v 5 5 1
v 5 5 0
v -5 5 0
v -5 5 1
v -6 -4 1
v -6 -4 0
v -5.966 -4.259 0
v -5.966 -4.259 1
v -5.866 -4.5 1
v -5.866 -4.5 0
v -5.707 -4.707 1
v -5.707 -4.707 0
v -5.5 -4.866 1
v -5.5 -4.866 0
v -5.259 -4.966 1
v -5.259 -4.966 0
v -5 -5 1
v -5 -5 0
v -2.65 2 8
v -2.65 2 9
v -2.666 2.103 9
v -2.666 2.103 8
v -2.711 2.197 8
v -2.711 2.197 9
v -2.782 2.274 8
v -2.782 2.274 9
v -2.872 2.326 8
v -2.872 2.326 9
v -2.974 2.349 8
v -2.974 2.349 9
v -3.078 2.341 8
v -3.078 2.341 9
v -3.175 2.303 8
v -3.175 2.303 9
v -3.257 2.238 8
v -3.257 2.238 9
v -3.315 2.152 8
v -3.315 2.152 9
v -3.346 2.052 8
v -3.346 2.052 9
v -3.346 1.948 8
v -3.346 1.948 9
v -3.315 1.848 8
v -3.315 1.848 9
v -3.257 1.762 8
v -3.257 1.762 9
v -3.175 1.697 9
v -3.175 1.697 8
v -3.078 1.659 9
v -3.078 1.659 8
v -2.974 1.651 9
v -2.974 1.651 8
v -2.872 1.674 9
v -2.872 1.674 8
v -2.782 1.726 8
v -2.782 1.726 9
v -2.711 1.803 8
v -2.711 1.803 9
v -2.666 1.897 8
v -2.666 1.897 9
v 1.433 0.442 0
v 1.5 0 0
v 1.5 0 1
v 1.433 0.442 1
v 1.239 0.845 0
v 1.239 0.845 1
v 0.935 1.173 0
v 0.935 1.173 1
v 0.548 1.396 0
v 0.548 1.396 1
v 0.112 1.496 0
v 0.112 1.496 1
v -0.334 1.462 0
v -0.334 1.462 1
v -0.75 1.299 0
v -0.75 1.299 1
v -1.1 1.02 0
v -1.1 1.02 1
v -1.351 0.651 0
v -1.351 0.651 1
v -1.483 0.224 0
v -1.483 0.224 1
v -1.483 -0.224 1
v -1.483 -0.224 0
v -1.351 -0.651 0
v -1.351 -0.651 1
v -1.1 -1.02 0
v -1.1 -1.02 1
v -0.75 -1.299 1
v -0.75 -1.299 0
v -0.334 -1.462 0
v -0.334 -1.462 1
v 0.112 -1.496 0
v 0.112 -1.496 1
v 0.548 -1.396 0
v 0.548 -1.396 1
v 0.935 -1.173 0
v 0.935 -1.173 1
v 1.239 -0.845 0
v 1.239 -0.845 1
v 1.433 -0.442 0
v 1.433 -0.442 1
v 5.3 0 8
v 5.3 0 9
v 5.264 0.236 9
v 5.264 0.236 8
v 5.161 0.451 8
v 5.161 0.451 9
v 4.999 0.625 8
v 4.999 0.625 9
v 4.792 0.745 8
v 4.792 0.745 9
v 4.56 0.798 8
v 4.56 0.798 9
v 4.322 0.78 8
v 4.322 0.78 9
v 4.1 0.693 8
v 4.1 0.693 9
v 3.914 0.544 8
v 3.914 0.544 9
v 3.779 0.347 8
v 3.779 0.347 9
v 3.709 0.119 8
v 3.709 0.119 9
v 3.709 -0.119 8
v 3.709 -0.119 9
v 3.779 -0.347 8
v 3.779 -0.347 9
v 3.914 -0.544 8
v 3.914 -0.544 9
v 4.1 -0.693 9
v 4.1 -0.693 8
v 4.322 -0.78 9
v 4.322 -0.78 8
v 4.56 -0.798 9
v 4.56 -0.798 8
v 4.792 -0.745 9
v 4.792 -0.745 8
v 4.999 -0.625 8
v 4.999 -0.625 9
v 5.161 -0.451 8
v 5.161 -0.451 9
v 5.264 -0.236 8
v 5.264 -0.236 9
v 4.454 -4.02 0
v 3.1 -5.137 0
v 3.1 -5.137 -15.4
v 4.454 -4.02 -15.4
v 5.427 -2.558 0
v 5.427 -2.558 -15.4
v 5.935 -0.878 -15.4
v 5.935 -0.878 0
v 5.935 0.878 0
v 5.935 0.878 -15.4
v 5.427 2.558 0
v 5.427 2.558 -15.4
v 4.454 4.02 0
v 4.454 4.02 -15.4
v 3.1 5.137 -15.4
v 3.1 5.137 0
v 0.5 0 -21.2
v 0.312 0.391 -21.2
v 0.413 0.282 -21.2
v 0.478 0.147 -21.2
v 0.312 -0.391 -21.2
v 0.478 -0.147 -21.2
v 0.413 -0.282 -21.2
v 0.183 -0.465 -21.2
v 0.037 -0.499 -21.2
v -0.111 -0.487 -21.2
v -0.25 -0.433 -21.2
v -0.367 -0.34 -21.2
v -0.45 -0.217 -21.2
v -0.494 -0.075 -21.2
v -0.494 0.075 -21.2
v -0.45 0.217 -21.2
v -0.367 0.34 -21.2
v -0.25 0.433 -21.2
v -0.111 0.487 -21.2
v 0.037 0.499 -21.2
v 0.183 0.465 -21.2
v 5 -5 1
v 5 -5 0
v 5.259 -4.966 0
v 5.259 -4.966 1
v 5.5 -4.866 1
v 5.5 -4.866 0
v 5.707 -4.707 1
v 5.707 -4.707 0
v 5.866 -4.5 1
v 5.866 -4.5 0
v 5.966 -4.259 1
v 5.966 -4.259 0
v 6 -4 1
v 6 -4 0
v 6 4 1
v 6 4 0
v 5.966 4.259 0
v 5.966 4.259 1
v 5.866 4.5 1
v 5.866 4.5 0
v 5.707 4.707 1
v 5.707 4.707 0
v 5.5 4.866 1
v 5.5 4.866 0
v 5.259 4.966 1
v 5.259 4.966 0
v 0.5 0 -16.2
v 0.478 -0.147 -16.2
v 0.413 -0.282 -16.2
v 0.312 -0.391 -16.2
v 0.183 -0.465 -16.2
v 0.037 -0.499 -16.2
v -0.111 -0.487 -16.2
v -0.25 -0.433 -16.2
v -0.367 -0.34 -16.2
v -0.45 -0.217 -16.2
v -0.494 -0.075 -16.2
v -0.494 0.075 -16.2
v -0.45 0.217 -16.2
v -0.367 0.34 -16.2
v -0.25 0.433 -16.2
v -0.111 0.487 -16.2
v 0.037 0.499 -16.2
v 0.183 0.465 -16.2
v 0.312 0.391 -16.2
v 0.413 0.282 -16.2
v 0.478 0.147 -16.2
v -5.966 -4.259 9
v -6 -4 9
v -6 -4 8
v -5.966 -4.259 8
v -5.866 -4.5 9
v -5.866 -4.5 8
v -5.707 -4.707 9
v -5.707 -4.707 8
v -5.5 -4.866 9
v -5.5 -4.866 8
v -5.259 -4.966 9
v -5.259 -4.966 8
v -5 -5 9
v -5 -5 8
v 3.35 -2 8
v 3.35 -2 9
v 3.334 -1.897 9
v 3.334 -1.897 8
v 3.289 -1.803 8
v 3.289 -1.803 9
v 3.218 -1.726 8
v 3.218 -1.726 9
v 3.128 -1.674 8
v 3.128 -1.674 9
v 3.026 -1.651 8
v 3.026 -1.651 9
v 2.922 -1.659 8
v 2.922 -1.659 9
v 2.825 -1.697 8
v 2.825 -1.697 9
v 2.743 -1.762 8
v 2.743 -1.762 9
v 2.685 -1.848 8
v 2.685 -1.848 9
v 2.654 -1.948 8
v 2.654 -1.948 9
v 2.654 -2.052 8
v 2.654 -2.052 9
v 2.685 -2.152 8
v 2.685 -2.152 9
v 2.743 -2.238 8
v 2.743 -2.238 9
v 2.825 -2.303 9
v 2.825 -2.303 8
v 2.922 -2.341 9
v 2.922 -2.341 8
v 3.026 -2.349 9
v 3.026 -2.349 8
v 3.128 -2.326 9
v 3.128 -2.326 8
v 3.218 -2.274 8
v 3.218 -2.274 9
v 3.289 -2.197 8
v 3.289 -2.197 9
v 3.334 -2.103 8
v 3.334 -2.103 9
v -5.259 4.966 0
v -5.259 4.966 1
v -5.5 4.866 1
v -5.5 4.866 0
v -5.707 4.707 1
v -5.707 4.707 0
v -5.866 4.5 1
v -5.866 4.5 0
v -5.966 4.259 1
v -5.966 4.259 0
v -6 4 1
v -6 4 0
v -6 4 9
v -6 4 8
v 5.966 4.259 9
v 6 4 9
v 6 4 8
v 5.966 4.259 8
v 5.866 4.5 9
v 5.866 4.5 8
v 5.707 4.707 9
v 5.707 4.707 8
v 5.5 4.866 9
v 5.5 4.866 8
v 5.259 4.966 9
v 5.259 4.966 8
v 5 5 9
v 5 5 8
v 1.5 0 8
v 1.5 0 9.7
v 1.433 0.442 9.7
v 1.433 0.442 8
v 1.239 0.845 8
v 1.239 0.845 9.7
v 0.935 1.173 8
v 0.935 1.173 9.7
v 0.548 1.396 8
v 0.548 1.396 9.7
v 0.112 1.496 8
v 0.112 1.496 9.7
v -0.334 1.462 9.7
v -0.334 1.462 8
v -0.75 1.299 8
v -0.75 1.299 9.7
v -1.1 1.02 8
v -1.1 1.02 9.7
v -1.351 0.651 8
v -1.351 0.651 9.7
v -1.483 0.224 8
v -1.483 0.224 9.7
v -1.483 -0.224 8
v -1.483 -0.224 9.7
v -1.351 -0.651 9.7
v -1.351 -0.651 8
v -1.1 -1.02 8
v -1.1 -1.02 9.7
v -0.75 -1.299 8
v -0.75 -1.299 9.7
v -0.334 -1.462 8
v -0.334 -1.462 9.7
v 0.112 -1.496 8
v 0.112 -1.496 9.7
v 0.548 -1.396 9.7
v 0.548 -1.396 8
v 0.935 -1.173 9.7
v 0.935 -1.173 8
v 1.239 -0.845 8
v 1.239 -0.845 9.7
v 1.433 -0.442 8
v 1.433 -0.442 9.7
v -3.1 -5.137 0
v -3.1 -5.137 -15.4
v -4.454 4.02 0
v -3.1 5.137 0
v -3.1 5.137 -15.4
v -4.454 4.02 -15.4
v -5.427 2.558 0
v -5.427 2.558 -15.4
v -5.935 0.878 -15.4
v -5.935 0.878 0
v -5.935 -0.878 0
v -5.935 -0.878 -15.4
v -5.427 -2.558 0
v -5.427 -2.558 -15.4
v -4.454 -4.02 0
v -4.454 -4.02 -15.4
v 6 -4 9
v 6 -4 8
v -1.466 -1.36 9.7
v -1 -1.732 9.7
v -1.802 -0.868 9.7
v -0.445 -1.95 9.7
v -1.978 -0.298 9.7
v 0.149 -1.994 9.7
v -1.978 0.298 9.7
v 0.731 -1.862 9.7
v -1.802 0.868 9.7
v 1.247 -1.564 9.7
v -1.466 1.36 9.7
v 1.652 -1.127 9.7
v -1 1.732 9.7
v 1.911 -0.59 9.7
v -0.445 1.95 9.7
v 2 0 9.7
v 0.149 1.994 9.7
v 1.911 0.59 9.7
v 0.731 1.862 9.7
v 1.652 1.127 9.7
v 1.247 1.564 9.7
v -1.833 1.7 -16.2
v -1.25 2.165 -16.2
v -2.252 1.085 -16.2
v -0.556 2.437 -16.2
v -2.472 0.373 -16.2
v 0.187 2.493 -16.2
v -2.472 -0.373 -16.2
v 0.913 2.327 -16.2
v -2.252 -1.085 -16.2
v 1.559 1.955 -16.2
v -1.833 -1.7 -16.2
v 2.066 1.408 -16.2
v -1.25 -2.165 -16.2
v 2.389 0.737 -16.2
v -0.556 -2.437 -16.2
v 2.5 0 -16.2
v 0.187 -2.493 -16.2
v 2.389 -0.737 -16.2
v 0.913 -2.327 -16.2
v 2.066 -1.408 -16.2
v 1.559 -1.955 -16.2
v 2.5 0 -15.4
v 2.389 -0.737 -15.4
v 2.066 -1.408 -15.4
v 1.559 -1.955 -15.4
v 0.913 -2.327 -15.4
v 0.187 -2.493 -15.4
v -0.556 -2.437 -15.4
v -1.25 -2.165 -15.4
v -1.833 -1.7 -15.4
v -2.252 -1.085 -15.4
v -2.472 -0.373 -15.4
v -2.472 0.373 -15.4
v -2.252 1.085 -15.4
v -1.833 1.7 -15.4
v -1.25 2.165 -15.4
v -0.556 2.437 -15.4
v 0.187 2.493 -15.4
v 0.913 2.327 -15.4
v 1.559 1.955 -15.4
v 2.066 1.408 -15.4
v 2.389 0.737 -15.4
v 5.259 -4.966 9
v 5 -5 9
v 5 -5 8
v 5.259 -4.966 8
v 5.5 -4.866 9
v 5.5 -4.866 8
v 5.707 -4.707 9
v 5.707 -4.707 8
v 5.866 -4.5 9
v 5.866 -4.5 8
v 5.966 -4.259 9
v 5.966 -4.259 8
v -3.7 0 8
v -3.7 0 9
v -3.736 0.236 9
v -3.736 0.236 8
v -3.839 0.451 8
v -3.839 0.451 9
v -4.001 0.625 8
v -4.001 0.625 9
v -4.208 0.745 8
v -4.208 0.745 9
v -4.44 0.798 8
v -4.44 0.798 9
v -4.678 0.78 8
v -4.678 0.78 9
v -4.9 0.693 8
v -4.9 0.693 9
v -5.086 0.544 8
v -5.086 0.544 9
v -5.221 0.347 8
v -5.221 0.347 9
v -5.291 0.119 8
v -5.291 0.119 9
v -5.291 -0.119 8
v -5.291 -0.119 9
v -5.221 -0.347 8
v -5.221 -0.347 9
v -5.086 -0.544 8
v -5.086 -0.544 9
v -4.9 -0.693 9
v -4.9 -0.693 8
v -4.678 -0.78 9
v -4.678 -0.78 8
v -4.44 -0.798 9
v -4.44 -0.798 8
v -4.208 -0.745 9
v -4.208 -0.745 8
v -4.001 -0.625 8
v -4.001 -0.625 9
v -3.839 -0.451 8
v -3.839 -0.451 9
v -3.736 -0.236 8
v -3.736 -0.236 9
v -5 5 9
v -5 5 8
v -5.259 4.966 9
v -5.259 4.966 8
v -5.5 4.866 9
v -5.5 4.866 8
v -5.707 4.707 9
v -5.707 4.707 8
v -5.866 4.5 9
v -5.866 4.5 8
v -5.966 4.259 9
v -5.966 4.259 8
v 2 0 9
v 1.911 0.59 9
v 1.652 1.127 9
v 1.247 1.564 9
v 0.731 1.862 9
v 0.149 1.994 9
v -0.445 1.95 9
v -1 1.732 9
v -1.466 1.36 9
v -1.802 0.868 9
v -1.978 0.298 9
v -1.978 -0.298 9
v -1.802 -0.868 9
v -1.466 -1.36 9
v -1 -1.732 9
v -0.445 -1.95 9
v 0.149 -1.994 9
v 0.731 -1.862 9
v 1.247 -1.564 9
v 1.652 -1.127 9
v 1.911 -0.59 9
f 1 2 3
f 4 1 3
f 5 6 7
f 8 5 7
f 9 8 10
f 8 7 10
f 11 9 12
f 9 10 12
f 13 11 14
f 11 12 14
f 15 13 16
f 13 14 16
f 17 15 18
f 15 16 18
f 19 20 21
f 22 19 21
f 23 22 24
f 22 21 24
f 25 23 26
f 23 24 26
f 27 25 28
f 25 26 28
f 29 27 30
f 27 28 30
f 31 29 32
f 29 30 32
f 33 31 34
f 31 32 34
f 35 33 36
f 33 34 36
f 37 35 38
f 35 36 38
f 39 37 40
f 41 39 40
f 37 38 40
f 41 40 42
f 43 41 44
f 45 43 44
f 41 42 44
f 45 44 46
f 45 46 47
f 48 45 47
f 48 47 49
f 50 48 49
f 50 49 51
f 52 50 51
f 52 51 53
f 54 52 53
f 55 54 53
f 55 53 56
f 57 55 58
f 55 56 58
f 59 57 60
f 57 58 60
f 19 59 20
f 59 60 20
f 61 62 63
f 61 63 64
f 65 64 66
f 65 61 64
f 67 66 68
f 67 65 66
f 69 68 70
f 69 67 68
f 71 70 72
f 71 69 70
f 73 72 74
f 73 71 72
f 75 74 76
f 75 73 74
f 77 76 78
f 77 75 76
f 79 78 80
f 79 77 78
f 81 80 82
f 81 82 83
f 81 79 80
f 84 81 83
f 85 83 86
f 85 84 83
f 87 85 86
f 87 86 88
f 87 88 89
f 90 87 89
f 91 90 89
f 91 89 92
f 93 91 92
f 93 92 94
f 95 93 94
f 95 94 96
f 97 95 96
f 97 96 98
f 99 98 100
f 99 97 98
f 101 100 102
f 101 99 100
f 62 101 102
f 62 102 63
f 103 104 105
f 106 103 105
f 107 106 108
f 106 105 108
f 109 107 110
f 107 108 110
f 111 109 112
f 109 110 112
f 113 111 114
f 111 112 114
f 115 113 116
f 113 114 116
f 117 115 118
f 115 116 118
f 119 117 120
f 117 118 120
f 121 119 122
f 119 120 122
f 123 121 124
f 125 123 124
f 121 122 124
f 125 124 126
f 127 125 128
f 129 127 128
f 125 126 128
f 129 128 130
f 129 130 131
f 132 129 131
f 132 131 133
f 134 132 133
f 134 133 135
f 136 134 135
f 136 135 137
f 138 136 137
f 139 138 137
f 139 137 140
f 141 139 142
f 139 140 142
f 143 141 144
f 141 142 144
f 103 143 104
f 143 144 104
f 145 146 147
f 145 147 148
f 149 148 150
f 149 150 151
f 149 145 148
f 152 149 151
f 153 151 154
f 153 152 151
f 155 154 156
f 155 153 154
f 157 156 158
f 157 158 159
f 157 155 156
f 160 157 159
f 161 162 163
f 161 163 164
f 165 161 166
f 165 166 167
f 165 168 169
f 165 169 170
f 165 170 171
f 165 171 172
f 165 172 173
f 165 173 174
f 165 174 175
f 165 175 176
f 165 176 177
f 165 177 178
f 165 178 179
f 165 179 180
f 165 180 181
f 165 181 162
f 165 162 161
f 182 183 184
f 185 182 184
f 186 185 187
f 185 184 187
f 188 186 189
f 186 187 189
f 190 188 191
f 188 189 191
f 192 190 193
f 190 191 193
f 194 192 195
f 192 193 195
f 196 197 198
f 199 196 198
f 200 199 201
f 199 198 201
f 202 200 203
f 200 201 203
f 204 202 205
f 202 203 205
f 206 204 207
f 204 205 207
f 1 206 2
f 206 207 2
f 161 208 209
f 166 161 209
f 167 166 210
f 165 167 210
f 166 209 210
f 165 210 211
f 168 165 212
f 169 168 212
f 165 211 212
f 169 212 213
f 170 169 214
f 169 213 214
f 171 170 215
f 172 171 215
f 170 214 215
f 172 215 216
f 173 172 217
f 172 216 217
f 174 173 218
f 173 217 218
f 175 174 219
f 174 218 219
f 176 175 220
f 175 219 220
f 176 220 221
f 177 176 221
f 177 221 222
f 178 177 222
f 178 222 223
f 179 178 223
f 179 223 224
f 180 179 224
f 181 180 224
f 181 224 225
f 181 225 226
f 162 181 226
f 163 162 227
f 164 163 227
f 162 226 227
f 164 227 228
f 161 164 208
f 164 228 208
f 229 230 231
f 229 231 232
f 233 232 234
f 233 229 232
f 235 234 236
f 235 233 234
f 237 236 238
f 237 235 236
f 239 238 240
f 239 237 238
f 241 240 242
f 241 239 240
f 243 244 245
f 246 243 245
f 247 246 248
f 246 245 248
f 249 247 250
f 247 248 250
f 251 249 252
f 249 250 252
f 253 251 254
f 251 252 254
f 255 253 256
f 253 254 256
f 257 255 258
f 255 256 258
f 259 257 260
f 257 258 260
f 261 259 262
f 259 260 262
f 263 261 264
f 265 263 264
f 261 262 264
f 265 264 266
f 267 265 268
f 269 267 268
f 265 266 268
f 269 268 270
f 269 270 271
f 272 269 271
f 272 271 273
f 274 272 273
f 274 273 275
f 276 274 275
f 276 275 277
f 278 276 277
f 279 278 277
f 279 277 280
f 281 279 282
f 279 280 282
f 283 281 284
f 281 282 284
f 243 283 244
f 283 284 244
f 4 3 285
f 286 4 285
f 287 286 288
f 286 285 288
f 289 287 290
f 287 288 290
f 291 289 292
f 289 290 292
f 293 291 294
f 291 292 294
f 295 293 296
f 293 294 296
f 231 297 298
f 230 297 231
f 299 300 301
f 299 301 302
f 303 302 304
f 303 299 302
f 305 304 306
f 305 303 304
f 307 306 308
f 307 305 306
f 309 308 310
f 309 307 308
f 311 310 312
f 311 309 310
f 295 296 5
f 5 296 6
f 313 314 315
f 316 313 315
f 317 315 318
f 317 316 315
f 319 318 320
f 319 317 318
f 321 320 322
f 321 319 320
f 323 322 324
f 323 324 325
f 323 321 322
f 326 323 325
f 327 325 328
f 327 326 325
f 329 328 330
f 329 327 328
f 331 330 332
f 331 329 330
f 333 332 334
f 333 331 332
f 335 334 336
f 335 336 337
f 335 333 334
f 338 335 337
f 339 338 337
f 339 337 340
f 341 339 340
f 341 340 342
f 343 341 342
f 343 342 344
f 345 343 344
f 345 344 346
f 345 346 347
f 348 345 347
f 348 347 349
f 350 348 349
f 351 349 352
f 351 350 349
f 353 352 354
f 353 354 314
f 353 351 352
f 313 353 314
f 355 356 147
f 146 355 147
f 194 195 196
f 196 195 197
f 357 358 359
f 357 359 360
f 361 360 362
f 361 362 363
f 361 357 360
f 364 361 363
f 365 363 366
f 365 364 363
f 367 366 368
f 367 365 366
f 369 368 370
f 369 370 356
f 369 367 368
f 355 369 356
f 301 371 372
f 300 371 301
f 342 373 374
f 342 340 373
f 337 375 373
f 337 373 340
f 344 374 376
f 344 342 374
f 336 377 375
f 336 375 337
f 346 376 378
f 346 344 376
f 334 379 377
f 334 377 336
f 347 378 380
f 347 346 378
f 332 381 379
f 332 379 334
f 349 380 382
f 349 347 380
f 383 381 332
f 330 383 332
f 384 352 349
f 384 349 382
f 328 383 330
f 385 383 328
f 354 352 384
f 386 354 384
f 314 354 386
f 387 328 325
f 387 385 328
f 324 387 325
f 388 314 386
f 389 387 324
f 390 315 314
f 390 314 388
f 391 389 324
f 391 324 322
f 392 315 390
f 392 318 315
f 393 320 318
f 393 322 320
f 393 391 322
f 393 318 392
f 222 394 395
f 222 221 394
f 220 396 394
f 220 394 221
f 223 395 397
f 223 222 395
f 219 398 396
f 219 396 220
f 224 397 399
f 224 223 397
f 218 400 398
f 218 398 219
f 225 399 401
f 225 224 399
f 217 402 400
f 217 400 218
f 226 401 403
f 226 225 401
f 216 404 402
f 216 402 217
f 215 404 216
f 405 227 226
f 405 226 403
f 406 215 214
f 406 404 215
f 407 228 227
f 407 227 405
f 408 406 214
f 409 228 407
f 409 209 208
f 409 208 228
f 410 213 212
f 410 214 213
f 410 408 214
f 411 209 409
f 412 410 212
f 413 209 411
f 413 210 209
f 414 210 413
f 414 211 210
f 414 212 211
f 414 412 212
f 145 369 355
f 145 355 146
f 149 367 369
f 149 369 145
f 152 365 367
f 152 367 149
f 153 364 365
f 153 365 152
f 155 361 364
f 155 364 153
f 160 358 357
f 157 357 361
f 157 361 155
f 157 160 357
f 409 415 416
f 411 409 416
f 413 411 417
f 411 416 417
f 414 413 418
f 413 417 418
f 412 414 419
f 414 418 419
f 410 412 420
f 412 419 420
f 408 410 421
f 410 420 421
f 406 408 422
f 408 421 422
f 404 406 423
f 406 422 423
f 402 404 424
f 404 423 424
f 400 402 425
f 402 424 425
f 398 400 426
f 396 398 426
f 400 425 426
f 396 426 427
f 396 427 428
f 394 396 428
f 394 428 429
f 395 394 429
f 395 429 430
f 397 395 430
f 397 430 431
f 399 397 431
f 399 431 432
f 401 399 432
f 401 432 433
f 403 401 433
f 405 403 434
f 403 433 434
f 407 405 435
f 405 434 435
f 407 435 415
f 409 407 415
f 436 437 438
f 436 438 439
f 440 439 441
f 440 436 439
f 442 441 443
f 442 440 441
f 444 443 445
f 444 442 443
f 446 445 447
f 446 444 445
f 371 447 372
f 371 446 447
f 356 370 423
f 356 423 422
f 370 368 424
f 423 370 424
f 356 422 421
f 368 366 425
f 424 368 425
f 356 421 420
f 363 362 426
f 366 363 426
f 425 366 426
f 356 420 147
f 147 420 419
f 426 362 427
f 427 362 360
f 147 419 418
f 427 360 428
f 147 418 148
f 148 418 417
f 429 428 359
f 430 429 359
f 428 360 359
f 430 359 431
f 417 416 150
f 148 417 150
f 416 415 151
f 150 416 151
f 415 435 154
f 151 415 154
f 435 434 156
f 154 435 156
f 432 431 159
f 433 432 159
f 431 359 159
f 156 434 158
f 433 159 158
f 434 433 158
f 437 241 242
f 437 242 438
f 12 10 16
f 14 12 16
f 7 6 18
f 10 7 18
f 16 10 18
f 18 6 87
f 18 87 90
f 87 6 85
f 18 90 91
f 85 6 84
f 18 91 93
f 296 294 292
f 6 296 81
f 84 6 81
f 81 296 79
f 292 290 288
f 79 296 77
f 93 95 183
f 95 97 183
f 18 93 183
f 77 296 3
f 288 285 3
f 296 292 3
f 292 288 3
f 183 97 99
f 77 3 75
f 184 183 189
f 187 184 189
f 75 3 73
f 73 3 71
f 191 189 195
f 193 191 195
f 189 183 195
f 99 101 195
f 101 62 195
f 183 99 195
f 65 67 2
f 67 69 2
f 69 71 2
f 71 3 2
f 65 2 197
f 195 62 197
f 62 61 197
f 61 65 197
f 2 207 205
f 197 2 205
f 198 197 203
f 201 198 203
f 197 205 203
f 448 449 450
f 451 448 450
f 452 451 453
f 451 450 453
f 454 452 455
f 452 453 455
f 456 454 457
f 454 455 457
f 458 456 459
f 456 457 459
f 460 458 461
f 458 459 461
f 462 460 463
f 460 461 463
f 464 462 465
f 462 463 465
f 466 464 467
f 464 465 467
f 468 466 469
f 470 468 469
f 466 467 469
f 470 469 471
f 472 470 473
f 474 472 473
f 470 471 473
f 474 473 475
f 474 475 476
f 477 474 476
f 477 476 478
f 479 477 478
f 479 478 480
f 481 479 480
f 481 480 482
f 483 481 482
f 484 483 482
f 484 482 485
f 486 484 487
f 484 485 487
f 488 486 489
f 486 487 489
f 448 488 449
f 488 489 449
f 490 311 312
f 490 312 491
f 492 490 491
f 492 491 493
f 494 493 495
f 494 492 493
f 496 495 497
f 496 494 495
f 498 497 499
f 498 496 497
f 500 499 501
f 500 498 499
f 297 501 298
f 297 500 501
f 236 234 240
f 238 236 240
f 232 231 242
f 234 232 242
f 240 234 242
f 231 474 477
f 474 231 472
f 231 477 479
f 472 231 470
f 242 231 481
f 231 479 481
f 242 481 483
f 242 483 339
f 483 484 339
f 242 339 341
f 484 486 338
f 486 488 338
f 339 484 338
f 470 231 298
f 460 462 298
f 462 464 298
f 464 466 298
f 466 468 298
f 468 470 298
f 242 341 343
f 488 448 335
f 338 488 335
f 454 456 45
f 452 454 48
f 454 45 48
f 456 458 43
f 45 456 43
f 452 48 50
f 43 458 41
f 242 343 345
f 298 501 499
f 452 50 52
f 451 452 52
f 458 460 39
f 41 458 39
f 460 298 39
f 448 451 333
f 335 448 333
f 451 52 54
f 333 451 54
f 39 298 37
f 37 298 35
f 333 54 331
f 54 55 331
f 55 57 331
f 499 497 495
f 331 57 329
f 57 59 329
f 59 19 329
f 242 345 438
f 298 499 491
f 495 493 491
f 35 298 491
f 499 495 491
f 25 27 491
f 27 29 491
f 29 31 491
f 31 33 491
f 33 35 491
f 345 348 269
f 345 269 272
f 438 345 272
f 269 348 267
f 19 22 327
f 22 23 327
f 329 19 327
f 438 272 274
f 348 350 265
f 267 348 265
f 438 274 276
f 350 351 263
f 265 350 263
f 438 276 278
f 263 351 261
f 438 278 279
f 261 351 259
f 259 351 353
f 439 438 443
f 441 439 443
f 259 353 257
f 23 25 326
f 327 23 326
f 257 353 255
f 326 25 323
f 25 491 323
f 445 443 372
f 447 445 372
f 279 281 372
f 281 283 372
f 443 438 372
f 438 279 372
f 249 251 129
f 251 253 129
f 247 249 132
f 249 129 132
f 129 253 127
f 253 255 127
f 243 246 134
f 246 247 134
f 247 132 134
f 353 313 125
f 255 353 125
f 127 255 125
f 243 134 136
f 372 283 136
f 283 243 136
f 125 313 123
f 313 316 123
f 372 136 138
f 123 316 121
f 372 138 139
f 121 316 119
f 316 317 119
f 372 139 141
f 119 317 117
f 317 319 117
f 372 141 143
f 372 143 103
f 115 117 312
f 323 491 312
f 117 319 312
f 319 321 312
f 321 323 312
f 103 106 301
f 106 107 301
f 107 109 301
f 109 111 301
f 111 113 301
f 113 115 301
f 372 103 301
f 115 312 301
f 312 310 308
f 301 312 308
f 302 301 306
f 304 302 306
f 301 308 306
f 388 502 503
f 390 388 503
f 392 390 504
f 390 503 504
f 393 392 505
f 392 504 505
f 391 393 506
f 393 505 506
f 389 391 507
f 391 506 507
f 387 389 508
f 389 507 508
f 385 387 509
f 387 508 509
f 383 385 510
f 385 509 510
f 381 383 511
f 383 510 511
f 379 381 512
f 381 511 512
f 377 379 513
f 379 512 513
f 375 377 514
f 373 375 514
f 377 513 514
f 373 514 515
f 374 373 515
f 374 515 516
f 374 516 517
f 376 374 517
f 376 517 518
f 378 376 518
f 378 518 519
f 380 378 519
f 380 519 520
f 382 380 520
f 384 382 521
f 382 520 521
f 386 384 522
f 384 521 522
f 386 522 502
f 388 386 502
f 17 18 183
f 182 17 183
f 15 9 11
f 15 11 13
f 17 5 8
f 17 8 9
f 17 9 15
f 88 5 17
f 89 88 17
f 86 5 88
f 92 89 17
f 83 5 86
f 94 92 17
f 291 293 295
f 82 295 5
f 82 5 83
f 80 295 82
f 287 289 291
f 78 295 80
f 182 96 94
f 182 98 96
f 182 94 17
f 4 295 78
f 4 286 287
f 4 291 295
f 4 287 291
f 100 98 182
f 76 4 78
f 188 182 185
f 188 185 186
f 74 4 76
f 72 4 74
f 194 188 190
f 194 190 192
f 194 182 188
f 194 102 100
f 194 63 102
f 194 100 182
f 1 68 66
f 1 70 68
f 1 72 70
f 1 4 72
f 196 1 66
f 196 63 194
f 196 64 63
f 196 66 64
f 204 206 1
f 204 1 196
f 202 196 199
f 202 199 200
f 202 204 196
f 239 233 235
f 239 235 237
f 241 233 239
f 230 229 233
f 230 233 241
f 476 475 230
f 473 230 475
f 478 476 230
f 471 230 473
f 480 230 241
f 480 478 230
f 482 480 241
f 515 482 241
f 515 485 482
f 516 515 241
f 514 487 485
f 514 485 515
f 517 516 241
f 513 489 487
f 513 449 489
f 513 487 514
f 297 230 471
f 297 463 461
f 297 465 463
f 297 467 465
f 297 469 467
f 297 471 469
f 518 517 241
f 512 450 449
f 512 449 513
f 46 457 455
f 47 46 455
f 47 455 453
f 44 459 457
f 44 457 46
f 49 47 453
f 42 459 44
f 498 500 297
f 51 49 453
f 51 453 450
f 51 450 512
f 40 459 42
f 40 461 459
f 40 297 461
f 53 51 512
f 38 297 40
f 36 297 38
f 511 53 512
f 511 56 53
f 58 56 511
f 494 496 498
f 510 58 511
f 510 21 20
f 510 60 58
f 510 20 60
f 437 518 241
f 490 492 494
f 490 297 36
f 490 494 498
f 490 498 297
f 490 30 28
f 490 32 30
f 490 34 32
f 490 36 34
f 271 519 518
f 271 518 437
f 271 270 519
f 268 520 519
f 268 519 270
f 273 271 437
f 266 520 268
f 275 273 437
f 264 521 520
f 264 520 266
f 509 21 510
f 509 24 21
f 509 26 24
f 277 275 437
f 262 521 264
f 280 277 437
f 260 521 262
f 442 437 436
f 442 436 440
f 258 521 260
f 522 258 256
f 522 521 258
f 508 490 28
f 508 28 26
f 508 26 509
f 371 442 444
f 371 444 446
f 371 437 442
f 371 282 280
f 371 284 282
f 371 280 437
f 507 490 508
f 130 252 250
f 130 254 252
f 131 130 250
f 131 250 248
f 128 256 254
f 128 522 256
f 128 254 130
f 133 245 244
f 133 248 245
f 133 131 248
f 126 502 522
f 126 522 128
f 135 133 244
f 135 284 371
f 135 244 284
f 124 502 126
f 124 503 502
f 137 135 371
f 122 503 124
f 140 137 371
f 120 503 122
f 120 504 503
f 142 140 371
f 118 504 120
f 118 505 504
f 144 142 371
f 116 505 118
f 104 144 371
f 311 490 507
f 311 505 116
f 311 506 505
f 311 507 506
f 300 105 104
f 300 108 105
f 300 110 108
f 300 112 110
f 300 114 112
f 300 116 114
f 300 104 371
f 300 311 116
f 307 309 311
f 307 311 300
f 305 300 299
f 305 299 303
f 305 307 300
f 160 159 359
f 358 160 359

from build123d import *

# Parameters (mm, degrees)
F1_DEPTH  = 15.4
F2_R      = 2.5
F3_DEPTH  = 0.8
F4_R      = 0.5
F5_DEPTH  = 5
F6_R      = 1.5
F7_DEPTH  = 1
F9_R      = 0.35
F9_R_2    = 0.8
F9_R_3    = 1.5
F10_DEPTH = 1
F11_R     = 2
F11_R_2   = 1.5
F12_DEPTH = 0.7


with BuildPart() as f1:
    # F0 (on Top) → F1 (new body)
    with BuildSketch(Plane.XY):
        with BuildLine():
            Line((3.1, 5.13712), (-3.1, 5.13712))
            ThreePointArc((-3.1, 5.13712), (-6, 0), (-3.1, -5.13712))
            Line((-3.1, -5.13712), (3.1, -5.13712))
            ThreePointArc((3.1, -5.13712), (6, 0), (3.1, 5.13712))
        make_face()
    extrude(amount=-F1_DEPTH)

    # F2 (on face) → F3 (join)
    with BuildSketch(Plane(origin=(0, 0, -15.4), x_dir=(1, 0, 0), z_dir=(0, 0, -1))):
        Circle(F2_R)
    extrude(amount=F3_DEPTH)

    # F4 (on face) → F5 (join)
    with BuildSketch(Plane(origin=(0, 0, -16.2), x_dir=(1, 0, 0), z_dir=(0, 0, -1))):
        Circle(F4_R)
    extrude(amount=F5_DEPTH)


with BuildPart() as f7:
    # F6 (on face) → F7 (new body)
    with BuildSketch(Plane.XY):
        with BuildLine():
            ThreePointArc((-6, -4), (-5.707107, -4.707107), (-5, -5))
            Line((-5, -5), (5, -5))
            ThreePointArc((5, -5), (5.707107, -4.707107), (6, -4))
            Line((6, -4), (6, 4))
            ThreePointArc((6, 4), (5.707107, 4.707107), (5, 5))
            Line((5, 5), (-5, 5))
            ThreePointArc((-5, 5), (-5.707107, 4.707107), (-6, 4))
            Line((-6, 4), (-6, -4))
        make_face()
        Circle(F6_R, mode=Mode.SUBTRACT)
    extrude(amount=F7_DEPTH)


with BuildPart() as f10:
    # F9 (on offset) → F10 (new body)
    with BuildSketch(Plane.XY.offset(9)):
        with BuildLine():
            ThreePointArc((-6, -4), (-5.707107, -4.707107), (-5, -5))
            Line((-5, -5), (5, -5))
            ThreePointArc((5, -5), (5.707107, -4.707107), (6, -4))
            Line((6, -4), (6, 4))
            ThreePointArc((6, 4), (5.707107, 4.707107), (5, 5))
            Line((5, 5), (-5, 5))
            ThreePointArc((-5, 5), (-5.707107, 4.707107), (-6, 4))
            Line((-6, 4), (-6, -4))
        make_face()
        with Locations((3, -2)):
            Circle(F9_R, mode=Mode.SUBTRACT)
        with Locations((-4.5, 0)):
            Circle(F9_R_2, mode=Mode.SUBTRACT)
        with Locations((-2.999999, 1.999999)):
            Circle(F9_R, mode=Mode.SUBTRACT)
        Circle(F9_R_3, mode=Mode.SUBTRACT)
        with Locations((4.5, 0)):
            Circle(F9_R_2, mode=Mode.SUBTRACT)
    extrude(amount=-F10_DEPTH)

    # F11 (on face) → F12 (join)
    with BuildSketch(Plane.XY.offset(9)):
        Circle(F11_R)
        Circle(F11_R_2, mode=Mode.SUBTRACT)
    extrude(amount=F12_DEPTH)


solid = Compound([f1.part, f7.part, f10.part])
